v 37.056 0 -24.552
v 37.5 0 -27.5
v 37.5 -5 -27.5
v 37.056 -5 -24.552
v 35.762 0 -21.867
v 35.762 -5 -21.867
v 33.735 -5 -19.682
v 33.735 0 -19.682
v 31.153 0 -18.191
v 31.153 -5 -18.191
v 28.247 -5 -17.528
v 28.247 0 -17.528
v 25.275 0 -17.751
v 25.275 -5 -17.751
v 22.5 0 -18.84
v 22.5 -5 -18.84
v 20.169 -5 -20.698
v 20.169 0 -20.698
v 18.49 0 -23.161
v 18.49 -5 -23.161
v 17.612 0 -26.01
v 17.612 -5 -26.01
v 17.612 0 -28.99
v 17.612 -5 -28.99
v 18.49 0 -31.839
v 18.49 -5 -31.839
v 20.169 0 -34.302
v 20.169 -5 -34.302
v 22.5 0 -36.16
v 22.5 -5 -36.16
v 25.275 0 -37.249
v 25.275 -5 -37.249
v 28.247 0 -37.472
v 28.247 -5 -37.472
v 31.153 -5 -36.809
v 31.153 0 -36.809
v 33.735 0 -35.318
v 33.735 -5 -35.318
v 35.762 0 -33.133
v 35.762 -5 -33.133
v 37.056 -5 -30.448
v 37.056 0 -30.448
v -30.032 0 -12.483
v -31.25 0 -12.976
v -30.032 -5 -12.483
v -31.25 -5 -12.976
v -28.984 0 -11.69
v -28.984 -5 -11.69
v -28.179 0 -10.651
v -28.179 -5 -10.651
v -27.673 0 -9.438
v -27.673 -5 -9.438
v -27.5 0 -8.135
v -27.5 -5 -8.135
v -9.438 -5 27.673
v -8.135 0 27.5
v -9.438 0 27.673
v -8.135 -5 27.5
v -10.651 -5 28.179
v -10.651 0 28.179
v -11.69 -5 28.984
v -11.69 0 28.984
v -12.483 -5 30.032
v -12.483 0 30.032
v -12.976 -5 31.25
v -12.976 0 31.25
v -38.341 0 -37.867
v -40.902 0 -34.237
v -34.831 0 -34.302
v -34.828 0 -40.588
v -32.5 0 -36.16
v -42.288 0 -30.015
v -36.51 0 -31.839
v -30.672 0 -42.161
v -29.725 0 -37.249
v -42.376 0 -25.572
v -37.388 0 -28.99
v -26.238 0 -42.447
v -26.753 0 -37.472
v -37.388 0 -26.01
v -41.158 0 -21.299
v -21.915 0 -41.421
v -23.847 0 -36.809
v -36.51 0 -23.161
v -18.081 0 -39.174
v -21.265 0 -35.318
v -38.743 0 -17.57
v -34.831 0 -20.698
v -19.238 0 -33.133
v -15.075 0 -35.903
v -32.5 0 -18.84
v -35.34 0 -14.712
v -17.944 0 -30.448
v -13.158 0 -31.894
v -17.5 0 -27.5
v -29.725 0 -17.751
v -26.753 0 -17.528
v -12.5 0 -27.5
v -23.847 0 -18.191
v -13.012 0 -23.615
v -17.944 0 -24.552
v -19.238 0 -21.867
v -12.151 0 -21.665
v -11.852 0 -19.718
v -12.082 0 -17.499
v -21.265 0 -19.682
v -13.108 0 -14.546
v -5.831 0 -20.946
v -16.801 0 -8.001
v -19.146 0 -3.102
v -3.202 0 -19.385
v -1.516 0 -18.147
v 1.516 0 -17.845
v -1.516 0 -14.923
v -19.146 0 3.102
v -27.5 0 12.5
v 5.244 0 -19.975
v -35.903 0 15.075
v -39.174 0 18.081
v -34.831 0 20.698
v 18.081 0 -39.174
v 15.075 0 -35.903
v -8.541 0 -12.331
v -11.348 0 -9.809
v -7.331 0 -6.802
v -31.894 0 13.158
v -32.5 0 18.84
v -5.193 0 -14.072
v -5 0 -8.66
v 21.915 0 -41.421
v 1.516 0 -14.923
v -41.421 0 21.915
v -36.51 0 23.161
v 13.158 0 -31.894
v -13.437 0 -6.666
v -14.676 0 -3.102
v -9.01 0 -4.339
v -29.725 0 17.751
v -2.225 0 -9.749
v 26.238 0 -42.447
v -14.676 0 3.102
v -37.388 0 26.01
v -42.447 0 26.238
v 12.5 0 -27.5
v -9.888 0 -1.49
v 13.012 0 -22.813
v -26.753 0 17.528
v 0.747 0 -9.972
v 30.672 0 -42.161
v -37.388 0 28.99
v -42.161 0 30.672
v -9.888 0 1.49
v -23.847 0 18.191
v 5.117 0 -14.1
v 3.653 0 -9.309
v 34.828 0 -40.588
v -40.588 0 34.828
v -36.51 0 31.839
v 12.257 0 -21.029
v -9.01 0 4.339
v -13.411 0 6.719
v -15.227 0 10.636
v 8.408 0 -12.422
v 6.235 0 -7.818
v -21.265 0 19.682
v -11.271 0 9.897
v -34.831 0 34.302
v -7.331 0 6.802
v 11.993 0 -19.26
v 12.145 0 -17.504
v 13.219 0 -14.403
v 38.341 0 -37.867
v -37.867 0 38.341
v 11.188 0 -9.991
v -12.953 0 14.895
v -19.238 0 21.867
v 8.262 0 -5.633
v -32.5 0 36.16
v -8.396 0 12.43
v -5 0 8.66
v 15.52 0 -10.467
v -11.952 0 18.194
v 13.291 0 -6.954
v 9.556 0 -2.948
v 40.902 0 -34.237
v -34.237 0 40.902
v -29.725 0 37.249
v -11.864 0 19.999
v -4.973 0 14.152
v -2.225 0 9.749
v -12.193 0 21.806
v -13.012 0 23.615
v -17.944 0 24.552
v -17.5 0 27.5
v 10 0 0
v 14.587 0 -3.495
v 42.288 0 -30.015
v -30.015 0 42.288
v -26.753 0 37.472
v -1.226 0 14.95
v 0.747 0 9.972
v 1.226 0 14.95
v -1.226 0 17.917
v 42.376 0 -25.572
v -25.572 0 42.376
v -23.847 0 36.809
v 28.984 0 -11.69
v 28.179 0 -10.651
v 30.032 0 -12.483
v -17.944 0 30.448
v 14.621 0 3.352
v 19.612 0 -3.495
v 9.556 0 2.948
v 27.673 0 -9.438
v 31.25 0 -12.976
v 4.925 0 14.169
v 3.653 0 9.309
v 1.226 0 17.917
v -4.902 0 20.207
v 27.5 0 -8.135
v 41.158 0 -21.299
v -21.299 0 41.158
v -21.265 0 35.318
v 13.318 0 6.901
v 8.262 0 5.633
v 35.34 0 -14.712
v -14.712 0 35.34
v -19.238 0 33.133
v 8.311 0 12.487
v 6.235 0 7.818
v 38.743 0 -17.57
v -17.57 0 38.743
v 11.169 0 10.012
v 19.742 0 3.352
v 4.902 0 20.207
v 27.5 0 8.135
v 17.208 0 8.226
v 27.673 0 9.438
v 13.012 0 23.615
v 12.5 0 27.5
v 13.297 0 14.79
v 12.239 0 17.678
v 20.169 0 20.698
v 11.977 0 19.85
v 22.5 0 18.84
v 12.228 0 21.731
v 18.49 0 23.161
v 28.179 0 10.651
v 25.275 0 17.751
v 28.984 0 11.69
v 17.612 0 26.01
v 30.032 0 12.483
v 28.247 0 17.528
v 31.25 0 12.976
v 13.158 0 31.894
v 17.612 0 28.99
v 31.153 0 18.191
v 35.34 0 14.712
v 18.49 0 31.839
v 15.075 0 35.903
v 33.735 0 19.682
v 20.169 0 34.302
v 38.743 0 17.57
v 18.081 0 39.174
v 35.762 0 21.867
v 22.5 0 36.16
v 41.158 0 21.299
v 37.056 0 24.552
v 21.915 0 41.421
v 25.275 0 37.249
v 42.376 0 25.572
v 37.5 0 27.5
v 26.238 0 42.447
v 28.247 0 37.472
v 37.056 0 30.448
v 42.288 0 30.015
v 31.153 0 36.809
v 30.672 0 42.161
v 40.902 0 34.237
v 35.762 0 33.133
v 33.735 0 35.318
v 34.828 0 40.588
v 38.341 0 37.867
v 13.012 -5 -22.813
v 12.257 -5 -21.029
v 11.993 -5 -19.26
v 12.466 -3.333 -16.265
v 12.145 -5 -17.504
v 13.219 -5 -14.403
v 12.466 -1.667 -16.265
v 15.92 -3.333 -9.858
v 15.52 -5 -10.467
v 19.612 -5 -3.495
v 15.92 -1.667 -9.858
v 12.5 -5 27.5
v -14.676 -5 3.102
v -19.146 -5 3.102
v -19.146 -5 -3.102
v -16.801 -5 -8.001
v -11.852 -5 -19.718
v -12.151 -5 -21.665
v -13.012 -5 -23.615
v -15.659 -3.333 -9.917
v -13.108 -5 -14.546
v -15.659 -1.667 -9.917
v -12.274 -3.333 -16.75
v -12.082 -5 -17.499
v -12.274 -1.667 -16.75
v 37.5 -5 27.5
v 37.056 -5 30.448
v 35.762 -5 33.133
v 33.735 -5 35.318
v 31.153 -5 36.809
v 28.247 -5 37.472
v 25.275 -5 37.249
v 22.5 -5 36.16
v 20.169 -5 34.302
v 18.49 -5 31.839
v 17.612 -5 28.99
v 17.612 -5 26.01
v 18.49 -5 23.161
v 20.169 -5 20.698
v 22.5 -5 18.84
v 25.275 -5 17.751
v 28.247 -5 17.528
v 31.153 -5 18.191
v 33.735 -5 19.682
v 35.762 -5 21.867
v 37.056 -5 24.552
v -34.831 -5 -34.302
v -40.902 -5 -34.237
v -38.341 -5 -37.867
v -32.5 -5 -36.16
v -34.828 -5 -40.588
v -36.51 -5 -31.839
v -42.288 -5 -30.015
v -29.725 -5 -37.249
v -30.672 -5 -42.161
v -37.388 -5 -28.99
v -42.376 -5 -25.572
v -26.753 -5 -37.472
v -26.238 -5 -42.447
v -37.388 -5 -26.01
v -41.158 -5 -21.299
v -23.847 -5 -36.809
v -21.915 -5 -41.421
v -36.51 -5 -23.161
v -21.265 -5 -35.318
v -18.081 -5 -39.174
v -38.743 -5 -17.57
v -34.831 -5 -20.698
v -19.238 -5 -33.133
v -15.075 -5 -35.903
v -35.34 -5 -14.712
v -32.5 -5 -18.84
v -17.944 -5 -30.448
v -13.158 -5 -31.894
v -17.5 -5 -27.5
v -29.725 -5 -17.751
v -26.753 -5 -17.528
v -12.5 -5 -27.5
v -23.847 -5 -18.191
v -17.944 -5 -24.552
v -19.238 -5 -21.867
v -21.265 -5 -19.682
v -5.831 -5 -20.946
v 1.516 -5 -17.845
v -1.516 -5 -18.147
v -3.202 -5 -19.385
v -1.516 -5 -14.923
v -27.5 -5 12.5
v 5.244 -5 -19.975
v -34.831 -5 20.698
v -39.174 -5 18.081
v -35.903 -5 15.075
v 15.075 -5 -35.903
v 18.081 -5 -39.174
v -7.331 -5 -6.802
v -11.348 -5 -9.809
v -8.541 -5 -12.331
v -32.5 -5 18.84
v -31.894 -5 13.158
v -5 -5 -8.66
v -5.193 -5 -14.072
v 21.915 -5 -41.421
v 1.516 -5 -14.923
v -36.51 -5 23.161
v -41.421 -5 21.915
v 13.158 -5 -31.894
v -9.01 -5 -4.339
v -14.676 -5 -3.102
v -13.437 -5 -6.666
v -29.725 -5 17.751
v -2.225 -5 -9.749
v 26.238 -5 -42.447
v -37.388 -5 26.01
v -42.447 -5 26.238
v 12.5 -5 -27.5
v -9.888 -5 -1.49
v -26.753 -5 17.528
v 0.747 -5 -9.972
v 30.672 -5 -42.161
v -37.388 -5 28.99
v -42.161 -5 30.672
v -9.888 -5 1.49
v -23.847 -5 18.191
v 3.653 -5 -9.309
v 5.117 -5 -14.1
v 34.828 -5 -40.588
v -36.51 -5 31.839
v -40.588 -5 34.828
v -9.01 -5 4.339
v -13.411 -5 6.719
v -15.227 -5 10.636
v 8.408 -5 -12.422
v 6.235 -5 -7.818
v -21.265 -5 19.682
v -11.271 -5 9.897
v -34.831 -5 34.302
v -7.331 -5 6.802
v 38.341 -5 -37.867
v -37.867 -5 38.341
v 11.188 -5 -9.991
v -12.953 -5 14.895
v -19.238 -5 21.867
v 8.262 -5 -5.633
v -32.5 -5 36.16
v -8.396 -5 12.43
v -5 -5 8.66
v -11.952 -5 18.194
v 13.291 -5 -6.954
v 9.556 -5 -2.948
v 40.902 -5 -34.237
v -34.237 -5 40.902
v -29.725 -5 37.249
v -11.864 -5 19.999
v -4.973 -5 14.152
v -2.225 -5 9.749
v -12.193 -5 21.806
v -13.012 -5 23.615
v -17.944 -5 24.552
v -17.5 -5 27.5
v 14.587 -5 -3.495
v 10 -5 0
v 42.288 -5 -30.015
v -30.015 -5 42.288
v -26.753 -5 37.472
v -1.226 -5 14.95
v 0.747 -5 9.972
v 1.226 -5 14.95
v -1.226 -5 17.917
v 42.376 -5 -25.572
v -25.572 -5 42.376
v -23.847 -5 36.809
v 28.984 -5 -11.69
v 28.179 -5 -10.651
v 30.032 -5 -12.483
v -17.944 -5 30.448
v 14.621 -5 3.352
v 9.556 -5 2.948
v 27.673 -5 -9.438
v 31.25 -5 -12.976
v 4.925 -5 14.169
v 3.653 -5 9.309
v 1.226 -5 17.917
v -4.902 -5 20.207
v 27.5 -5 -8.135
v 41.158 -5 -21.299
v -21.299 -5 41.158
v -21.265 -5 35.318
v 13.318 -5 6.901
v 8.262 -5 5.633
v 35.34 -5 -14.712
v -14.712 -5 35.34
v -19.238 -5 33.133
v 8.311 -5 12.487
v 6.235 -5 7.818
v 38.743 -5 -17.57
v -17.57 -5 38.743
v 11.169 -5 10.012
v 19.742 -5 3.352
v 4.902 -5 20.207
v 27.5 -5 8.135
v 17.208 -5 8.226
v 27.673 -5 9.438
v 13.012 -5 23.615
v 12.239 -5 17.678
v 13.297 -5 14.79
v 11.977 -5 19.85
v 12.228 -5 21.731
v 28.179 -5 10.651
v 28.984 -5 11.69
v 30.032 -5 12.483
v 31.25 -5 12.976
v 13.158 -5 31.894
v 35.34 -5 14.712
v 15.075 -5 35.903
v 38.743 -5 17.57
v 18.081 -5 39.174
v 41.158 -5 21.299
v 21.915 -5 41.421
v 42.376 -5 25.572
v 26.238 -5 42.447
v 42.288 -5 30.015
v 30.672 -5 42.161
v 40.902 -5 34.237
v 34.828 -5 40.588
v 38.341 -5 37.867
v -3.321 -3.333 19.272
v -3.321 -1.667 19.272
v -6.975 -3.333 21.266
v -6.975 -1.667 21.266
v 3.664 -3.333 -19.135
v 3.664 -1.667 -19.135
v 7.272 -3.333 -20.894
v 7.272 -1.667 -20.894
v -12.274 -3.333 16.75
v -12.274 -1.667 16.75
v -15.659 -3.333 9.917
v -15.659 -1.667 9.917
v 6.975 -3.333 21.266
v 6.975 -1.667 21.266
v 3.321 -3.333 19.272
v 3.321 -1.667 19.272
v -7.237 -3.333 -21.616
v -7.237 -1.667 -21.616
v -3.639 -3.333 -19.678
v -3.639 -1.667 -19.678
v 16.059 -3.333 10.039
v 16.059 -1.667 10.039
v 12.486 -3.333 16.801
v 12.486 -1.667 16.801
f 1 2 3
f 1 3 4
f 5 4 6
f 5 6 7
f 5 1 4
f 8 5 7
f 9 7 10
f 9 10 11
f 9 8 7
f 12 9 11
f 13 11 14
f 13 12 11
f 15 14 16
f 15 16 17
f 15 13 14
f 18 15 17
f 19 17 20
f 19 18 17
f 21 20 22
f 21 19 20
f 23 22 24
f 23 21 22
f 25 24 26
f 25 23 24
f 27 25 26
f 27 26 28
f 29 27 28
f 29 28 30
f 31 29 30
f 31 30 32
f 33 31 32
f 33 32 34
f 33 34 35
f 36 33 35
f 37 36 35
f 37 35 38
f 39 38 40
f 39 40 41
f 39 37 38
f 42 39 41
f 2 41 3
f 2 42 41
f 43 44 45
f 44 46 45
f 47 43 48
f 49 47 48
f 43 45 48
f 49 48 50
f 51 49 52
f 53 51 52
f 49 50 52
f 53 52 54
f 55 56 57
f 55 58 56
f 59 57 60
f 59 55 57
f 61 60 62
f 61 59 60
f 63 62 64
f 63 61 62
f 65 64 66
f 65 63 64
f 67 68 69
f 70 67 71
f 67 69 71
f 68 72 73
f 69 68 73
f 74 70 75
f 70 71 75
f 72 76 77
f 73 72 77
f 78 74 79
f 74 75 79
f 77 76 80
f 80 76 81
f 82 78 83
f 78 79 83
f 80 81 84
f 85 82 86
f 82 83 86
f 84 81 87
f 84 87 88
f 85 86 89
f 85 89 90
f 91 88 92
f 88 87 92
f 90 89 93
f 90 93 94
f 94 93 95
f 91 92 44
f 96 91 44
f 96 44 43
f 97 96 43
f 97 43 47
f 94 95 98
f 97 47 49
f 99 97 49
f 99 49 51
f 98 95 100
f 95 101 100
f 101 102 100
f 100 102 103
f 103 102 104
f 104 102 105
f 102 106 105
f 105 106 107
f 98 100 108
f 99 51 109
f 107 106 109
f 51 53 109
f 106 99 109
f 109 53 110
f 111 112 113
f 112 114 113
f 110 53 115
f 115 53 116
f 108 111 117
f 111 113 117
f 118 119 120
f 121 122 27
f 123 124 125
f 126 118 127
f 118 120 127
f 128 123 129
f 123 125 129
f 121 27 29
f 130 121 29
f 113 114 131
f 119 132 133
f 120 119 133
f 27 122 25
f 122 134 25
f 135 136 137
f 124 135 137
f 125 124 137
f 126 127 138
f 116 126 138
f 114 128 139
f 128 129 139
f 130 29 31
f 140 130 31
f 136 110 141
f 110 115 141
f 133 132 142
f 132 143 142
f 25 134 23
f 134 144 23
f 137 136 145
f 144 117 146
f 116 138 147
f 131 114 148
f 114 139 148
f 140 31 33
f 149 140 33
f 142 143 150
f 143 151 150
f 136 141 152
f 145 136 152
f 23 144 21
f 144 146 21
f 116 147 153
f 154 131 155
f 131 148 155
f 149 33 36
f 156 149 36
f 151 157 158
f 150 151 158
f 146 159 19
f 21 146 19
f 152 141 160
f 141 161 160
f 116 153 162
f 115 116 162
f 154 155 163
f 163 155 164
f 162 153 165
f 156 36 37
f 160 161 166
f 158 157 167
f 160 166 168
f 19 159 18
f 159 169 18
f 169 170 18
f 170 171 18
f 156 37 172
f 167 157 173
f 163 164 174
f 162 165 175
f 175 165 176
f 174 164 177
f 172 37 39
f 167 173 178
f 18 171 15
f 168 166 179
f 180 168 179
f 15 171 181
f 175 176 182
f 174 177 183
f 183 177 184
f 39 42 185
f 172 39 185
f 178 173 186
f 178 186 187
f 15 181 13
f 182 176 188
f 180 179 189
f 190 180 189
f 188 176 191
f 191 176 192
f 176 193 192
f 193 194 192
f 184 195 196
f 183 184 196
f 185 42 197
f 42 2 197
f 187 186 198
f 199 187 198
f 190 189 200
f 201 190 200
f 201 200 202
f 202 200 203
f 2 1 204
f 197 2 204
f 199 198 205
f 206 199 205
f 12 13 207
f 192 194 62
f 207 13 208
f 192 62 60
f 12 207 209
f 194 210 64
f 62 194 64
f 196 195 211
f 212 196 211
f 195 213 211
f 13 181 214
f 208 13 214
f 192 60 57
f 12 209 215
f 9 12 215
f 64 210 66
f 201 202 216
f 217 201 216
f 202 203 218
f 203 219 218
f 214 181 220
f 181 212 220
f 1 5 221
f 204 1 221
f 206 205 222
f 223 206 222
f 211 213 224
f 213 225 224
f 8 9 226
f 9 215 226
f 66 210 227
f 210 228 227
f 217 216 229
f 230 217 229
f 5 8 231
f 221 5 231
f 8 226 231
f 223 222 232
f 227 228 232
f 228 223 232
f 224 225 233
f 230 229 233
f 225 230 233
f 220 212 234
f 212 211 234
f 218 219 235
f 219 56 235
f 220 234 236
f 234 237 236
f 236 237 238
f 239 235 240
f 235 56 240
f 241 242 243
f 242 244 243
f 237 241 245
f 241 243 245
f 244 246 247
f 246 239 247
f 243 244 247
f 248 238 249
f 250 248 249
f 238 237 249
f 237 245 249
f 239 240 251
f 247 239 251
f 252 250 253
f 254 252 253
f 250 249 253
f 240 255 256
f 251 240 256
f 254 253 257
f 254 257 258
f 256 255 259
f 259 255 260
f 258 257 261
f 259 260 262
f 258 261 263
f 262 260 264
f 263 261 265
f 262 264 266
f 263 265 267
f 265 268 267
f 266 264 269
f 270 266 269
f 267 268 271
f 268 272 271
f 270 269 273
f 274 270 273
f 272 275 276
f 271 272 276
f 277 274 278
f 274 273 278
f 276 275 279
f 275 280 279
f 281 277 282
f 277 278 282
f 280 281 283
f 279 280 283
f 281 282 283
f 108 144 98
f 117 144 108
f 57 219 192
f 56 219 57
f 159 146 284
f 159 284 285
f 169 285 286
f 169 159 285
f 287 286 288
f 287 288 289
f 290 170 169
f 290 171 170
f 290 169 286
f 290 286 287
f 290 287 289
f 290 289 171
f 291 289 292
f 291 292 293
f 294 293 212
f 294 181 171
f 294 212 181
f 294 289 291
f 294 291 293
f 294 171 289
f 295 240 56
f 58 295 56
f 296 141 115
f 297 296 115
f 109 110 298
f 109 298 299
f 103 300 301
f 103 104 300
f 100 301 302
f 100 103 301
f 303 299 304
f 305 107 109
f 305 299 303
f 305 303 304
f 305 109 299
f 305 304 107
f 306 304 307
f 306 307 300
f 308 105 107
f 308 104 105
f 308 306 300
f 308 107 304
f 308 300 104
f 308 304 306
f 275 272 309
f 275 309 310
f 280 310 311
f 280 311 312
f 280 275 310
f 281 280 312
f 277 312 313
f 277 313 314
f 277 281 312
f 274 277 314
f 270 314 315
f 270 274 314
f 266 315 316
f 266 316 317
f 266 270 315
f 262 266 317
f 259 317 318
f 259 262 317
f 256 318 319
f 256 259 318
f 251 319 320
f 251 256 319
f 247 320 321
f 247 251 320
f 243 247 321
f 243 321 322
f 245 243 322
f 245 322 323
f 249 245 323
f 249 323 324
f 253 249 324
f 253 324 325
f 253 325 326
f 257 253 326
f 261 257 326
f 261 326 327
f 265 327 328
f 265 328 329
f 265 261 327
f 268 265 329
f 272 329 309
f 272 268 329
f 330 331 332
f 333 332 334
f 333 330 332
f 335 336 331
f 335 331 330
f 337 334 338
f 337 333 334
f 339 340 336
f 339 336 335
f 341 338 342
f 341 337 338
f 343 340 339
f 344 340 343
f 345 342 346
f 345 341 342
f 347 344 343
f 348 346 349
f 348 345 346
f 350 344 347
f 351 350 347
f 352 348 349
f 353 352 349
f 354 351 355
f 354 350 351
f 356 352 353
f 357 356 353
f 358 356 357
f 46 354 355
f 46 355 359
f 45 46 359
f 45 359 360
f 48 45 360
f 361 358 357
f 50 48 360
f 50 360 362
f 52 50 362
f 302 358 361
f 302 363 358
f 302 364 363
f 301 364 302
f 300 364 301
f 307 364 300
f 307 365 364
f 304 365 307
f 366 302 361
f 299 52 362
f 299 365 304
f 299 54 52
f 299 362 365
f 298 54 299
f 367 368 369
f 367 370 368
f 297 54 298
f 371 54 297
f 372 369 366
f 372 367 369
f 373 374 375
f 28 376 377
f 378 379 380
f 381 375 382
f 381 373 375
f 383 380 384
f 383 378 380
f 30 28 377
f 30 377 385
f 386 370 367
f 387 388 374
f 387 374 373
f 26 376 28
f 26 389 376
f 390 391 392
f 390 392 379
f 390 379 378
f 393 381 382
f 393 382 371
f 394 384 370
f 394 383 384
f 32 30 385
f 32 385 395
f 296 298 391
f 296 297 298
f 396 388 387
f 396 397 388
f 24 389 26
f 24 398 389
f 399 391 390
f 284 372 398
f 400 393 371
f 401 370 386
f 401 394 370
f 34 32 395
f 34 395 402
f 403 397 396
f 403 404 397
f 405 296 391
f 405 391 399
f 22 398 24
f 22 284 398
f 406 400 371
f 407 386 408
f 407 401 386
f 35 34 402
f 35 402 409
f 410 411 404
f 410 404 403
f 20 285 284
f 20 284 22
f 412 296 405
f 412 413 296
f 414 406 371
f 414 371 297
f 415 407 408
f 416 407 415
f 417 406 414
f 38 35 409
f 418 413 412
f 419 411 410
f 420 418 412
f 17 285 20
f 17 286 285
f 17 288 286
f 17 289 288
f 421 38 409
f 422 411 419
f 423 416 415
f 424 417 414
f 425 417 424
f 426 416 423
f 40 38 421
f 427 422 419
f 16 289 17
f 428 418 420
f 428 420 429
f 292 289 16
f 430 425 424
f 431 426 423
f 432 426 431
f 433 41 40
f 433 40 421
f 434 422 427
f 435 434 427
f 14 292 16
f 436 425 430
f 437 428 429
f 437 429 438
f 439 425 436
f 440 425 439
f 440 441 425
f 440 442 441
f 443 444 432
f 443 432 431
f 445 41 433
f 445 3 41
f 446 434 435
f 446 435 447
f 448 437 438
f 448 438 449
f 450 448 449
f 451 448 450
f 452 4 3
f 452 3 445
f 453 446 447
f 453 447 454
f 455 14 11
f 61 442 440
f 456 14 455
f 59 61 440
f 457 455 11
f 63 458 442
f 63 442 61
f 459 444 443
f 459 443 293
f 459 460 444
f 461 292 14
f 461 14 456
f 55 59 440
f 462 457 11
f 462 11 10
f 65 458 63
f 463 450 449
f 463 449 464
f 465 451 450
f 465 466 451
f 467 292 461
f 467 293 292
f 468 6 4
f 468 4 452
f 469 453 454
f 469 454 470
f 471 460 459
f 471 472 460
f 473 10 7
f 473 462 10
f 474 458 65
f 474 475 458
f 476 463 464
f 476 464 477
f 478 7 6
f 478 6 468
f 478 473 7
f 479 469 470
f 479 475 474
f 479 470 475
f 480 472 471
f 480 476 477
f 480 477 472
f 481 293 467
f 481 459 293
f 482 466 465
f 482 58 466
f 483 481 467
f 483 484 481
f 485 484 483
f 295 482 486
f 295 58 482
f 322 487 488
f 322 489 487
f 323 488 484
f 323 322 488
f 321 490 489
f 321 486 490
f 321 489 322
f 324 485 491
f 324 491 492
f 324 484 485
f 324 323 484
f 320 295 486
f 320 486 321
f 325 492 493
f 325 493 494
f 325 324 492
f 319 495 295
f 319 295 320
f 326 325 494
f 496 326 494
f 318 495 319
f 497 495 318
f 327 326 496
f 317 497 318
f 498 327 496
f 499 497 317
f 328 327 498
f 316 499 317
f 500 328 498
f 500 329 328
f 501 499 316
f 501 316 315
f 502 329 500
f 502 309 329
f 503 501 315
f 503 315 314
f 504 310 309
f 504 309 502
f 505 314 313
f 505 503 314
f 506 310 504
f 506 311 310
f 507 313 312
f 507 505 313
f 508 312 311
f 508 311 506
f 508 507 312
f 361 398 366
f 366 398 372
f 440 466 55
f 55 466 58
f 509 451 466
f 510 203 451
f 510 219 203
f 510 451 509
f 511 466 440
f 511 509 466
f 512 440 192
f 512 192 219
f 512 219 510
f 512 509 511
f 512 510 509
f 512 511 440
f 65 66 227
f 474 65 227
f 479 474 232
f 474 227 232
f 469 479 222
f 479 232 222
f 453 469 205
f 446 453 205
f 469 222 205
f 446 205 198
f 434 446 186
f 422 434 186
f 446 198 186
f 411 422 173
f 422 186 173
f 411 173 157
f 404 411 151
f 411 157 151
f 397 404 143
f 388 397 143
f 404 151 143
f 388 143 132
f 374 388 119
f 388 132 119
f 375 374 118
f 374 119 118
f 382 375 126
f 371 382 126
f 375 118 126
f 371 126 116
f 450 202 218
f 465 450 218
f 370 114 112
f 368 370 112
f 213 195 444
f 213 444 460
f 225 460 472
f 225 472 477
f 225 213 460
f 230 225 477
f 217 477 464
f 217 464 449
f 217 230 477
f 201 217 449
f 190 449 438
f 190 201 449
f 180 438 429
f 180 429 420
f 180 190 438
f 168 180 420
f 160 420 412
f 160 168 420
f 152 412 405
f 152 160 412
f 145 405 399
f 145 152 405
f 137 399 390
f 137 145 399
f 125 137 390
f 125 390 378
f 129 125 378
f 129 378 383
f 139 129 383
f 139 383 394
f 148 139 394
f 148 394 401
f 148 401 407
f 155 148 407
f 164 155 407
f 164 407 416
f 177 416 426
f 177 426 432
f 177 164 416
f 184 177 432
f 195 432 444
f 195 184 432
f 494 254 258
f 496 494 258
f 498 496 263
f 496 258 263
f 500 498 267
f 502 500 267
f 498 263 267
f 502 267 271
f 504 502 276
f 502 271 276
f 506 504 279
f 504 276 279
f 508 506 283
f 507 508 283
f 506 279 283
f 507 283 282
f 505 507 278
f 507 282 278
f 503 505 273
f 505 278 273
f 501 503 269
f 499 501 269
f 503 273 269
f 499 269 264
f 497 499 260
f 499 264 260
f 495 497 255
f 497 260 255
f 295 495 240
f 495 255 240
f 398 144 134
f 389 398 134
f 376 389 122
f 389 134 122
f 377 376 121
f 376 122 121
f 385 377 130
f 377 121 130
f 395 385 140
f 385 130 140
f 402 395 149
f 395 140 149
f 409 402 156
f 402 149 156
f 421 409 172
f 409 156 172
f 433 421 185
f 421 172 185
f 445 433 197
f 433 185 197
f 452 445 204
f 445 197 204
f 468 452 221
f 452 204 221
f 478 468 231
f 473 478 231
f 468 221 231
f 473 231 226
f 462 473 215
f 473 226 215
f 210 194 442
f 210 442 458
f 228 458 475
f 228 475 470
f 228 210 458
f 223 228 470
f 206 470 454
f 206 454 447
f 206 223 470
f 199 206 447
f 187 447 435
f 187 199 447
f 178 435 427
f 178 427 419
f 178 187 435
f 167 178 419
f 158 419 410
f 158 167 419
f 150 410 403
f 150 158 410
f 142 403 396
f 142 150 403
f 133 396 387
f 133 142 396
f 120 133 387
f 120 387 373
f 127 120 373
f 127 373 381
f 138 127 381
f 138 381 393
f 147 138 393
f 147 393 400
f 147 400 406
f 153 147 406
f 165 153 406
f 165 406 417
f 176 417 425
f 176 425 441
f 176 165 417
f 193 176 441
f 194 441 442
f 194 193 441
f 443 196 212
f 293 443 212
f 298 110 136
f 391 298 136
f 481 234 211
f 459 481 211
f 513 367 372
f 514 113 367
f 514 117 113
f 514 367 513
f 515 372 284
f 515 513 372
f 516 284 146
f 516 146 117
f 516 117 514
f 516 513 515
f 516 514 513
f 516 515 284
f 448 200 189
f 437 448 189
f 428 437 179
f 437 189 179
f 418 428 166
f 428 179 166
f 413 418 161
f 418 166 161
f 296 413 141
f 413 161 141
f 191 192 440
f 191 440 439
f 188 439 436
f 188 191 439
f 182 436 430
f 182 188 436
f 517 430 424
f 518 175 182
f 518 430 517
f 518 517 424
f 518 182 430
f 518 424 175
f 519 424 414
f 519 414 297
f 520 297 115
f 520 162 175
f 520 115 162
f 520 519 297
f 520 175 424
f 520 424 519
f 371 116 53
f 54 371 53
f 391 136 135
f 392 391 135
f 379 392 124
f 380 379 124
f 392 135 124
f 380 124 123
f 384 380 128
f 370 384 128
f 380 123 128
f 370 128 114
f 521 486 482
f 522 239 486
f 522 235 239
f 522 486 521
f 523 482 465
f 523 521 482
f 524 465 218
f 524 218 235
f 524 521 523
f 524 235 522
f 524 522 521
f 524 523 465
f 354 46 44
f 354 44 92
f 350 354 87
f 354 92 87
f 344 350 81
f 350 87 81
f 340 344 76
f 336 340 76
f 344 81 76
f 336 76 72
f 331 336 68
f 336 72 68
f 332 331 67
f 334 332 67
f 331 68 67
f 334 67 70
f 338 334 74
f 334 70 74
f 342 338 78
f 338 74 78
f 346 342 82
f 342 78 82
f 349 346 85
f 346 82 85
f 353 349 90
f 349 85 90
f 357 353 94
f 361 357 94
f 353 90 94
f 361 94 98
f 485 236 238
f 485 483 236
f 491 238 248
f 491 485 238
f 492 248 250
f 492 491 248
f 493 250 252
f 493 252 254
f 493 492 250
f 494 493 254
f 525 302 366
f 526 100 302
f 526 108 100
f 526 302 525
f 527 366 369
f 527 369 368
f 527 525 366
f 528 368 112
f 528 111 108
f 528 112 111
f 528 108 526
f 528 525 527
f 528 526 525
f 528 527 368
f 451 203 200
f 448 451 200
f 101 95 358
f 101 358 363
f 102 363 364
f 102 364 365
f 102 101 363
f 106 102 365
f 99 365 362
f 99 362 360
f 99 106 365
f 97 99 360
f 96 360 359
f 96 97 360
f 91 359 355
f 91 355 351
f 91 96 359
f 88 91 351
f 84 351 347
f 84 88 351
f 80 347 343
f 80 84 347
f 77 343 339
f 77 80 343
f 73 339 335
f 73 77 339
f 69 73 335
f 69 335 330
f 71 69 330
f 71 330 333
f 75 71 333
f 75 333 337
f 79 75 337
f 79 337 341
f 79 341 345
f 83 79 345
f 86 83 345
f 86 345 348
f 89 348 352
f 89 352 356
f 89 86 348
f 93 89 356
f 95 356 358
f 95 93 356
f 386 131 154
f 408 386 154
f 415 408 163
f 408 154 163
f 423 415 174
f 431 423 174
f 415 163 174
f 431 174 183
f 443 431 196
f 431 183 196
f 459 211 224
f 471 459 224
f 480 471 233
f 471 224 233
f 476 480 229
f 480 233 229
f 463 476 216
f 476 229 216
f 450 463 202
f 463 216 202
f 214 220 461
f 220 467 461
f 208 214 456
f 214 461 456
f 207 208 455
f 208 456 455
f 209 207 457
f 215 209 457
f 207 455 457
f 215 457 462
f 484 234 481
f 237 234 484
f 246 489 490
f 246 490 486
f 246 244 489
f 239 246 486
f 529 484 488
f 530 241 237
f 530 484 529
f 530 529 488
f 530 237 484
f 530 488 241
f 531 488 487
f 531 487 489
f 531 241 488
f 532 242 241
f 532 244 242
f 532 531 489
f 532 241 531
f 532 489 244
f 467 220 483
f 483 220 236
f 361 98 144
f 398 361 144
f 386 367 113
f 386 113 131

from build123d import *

# Parameters (mm, degrees)
F0_R     = 10
F1_DEPTH = 5
F2_R     = 5
F3_R     = 5
F4_DEPTH = 25


with BuildPart() as f1:
    # F0 (on Front) → F1 (new body)
    with BuildSketch(Plane.XZ):
        with BuildLine():
            add(Edge.make_bspline(
                [(19.6117025062, -3.4953018185), (20.0776619455, -2.3335824214), (20.6438929209, -0.0613566909), (20.1493664179, 2.2303480995), (19.742406118, 3.3519886549)],
                knots=[0.4195745688, 0.4195745688, 0.4195745688, 0.4195745688, 0.4960722568, 0.5688744263, 0.5688744263, 0.5688744263, 0.5688744263], degree=3))
            Line((19.742406118, 3.3519886549), (14.6206761833, 3.3519886549))
            ThreePointArc((14.6206761833, 3.3519886549), (14.9048673719, 1.6866916212), (15, 0))
            ThreePointArc((15, 0), (14.8964119942, -1.7598038809), (14.5870787068, -3.4953018185))
            Line((14.5870787068, -3.4953018185), (19.6117025062, -3.4953018185))
        make_face()
        with BuildLine():
            add(Edge.make_bspline(
                [(-1.5163984723, -18.1465453552), (-0.9012756584, -17.6861315251), (-0.0133596841, -17.0968852874), (0.8972354155, -17.4862781525), (1.5163984723, -17.845237755)],
                knots=[0.3644446734, 0.3644446734, 0.3644446734, 0.3644446734, 0.5028904355, 0.6389885865, 0.6389885865, 0.6389885865, 0.6389885865], degree=3))
            Line((1.5163984723, -17.845237755), (1.5163984723, -14.9231543473))
            ThreePointArc((1.5163984723, -14.9231543473), (0, -15), (-1.5163984723, -14.9231543473))
            Line((-1.5163984723, -14.9231543473), (-1.5163984723, -18.1465453552))
        make_face()
        with BuildLine():
            Line((-14.6757838937, 3.1018328621), (-19.1463490467, 3.1018328621))
            add(Edge.make_bspline(
                [(-19.1463490467, 3.1018328621), (-19.4804537552, 2.0677531569), (-19.877871021, 0), (-19.4804537552, -2.0677531569), (-19.1463490467, -3.1018328621)],
                knots=[0.434082988, 0.434082988, 0.434082988, 0.434082988, 0.5, 0.565917012, 0.565917012, 0.565917012, 0.565917012], degree=3))
            Line((-19.1463490467, -3.1018328621), (-14.6757838937, -3.1018328621))
            ThreePointArc((-14.6757838937, -3.1018328621), (-15, 0), (-14.6757838937, 3.1018328621))
        make_face()
        with BuildLine():
            Line((1.225561158, 14.9498494925), (1.225561158, 17.9168751217))
            add(Edge.make_bspline(
                [(1.225561158, 17.9168751217), (0.7517359921, 17.6368227378), (0, 17.3228835959), (-0.7517359921, 17.6368227378), (-1.225561158, 17.9168751217)],
                knots=[0.3852289018, 0.3852289018, 0.3852289018, 0.3852289018, 0.5, 0.6147710982, 0.6147710982, 0.6147710982, 0.6147710982], degree=3))
            Line((-1.225561158, 17.9168751217), (-1.225561158, 14.9498494925))
            ThreePointArc((-1.225561158, 14.9498494925), (0, 15), (1.225561158, 14.9498494925))
        make_face()
        with BuildLine():
            Line((27.5, -12.5), (27.5, 12.5))
            ThreePointArc((27.5, 12.5), (18.3695172954, 15.5989796412), (13.0117252596, 23.6154285891))
            add(Edge.make_bspline(
                [(19.742406118, 3.3519886549), (17.3324368296, 9.9942072978), (9.1074771998, 16.7819842724), (13.0117252596, 23.6154285891)],
                knots=[0.5688744263, 0.5688744263, 0.5688744263, 0.5688744263, 1, 1, 1, 1], degree=3))
            add(Edge.make_bspline(
                [(19.6117025062, -3.4953018185), (20.0776619455, -2.3335824214), (20.6438929209, -0.0613566909), (20.1493664179, 2.2303480995), (19.742406118, 3.3519886549)],
                knots=[0.4195745688, 0.4195745688, 0.4195745688, 0.4195745688, 0.4960722568, 0.5688744263, 0.5688744263, 0.5688744263, 0.5688744263], degree=3))
            add(Edge.make_bspline(
                [(13.0117252596, -22.8125530654), (9.2106265425, -16.1632445639), (17.0560078684, -9.8671011282), (19.6117025062, -3.4953018185)],
                knots=[0, 0, 0, 0, 0.4195745688, 0.4195745688, 0.4195745688, 0.4195745688], degree=3))
            add(Edge.make_bspline(
                [(1.5163984723, -17.845237755), (3.1587788316, -18.7974072918), (5.9815411198, -20.9170774405), (13.0117252596, -22.8125530654)],
                knots=[0.6389885865, 0.6389885865, 0.6389885865, 0.6389885865, 1, 1, 1, 1], degree=3))
            add(Edge.make_bspline(
                [(-1.5163984723, -18.1465453552), (-0.9012756584, -17.6861315251), (-0.0133596841, -17.0968852874), (0.8972354155, -17.4862781525), (1.5163984723, -17.845237755)],
                knots=[0.3644446734, 0.3644446734, 0.3644446734, 0.3644446734, 0.5028904355, 0.6389885865, 0.6389885865, 0.6389885865, 0.6389885865], degree=3))
            add(Edge.make_bspline(
                [(-13.0117252596, -23.6154285891), (-5.9146832629, -21.7019267737), (-3.1356479862, -19.3585388852), (-1.5163984723, -18.1465453552)],
                knots=[0, 0, 0, 0, 0.3644446734, 0.3644446734, 0.3644446734, 0.3644446734], degree=3))
            ThreePointArc((-13.0117252596, -23.6154285891), (-12.6284815653, -25.5409340371), (-12.5, -27.5))
            Line((-12.5, -27.5), (12.5, -27.5))
            ThreePointArc((12.5, -27.5), (16.8933982822, -16.8933982822), (27.5, -12.5))
        make_face()
        with BuildLine():
            ThreePointArc((-13.0117252596, 23.6154285891), (-18.3695172954, 15.5989796412), (-27.5, 12.5))
            Line((-27.5, 12.5), (-27.5, -12.5))
            ThreePointArc((-27.5, -12.5), (-18.3695172954, -15.5989796412), (-13.0117252596, -23.6154285891))
            add(Edge.make_bspline(
                [(-19.1463490467, -3.1018328621), (-16.9461708863, -9.9115530651), (-8.8743910836, -16.7300820857), (-13.0117252596, -23.6154285891)],
                knots=[0.565917012, 0.565917012, 0.565917012, 0.565917012, 1, 1, 1, 1], degree=3))
            add(Edge.make_bspline(
                [(-19.1463490467, 3.1018328621), (-19.4804537552, 2.0677531569), (-19.877871021, 0), (-19.4804537552, -2.0677531569), (-19.1463490467, -3.1018328621)],
                knots=[0.434082988, 0.434082988, 0.434082988, 0.434082988, 0.5, 0.565917012, 0.565917012, 0.565917012, 0.565917012], degree=3))
            add(Edge.make_bspline(
                [(-13.0117252596, 23.6154285891), (-8.8743910836, 16.7300820857), (-16.9461708863, 9.9115530651), (-19.1463490467, 3.1018328621)],
                knots=[0, 0, 0, 0, 0.434082988, 0.434082988, 0.434082988, 0.434082988], degree=3))
        make_face()
        with BuildLine():
            ThreePointArc((13.0117252596, 23.6154285891), (12.6284815653, 25.5409340371), (12.5, 27.5))
            Line((12.5, 27.5), (-12.5, 27.5))
            ThreePointArc((-12.5, 27.5), (-12.6284815653, 25.5409340371), (-13.0117252596, 23.6154285891))
            add(Edge.make_bspline(
                [(-1.225561158, 17.9168751217), (-2.8159541317, 18.856870242), (-5.5099399576, 21.1835256037), (-13.0117252596, 23.6154285891)],
                knots=[0.6147710982, 0.6147710982, 0.6147710982, 0.6147710982, 1, 1, 1, 1], degree=3))
            add(Edge.make_bspline(
                [(1.225561158, 17.9168751217), (0.7517359921, 17.6368227378), (0, 17.3228835959), (-0.7517359921, 17.6368227378), (-1.225561158, 17.9168751217)],
                knots=[0.3852289018, 0.3852289018, 0.3852289018, 0.3852289018, 0.5, 0.6147710982, 0.6147710982, 0.6147710982, 0.6147710982], degree=3))
            add(Edge.make_bspline(
                [(13.0117252596, 23.6154285891), (5.5099399576, 21.1835256037), (2.8159541317, 18.856870242), (1.225561158, 17.9168751217)],
                knots=[0, 0, 0, 0, 0.3852289018, 0.3852289018, 0.3852289018, 0.3852289018], degree=3))
        make_face()
        with BuildLine():
            ThreePointArc((27.5, 12.5), (38.1066017178, 16.8933982822), (42.5, 27.5))
            ThreePointArc((42.5, 27.5), (27.5, 42.5), (12.5, 27.5))
            ThreePointArc((12.5, 27.5), (12.6284815653, 25.5409340371), (13.0117252596, 23.6154285891))
            ThreePointArc((13.0117252596, 23.6154285891), (18.3695172954, 15.5989796412), (27.5, 12.5))
        make_face()
        with Locations((27.5, 27.5)):
            Circle(F0_R, mode=Mode.SUBTRACT)
        with BuildLine():
            ThreePointArc((15, 0), (14.9048673719, 1.6866916212), (14.6206761833, 3.3519886549))
            ThreePointArc((14.6206761833, 3.3519886549), (9.8185234873, 11.3400439386), (1.225561158, 14.9498494925))
            ThreePointArc((1.225561158, 14.9498494925), (0, 15), (-1.225561158, 14.9498494925))
            ThreePointArc((-1.225561158, 14.9498494925), (-9.9149920894, 11.2557954791), (-14.6757838937, 3.1018328621))
            ThreePointArc((-14.6757838937, 3.1018328621), (-15, 0), (-14.6757838937, -3.1018328621))
            ThreePointArc((-14.6757838937, -3.1018328621), (-10.0241010997, -11.1587363596), (-1.5163984723, -14.9231543473))
            ThreePointArc((-1.5163984723, -14.9231543473), (0, -15), (1.5163984723, -14.9231543473))
            ThreePointArc((1.5163984723, -14.9231543473), (9.8731680665, -11.2924998265), (14.5870787068, -3.4953018185))
            ThreePointArc((14.5870787068, -3.4953018185), (14.8964119942, -1.7598038809), (15, 0))
        make_face()
        Circle(F0_R, mode=Mode.SUBTRACT)
        with BuildLine():
            ThreePointArc((42.5, -27.5), (38.1066017178, -16.8933982822), (27.5, -12.5))
            ThreePointArc((27.5, -12.5), (16.8933982822, -16.8933982822), (12.5, -27.5))
            ThreePointArc((12.5, -27.5), (27.5, -42.5), (42.5, -27.5))
        make_face()
        with Locations((27.5, -27.5)):
            Circle(F0_R, mode=Mode.SUBTRACT)
        with BuildLine():
            ThreePointArc((-13.0117252596, -23.6154285891), (-18.3695172954, -15.5989796412), (-27.5, -12.5))
            ThreePointArc((-27.5, -12.5), (-38.1066017178, -38.1066017178), (-12.5, -27.5))
            ThreePointArc((-12.5, -27.5), (-12.6284815653, -25.5409340371), (-13.0117252596, -23.6154285891))
        make_face()
        with Locations((-27.5, -27.5)):
            Circle(F0_R, mode=Mode.SUBTRACT)
        with BuildLine():
            ThreePointArc((-13.0117252596, 23.6154285891), (-12.6284815653, 25.5409340371), (-12.5, 27.5))
            ThreePointArc((-12.5, 27.5), (-38.1066017178, 38.1066017178), (-27.5, 12.5))
            ThreePointArc((-27.5, 12.5), (-18.3695172954, 15.5989796412), (-13.0117252596, 23.6154285891))
        make_face()
        with Locations((-27.5, 27.5)):
            Circle(F0_R, mode=Mode.SUBTRACT)
    extrude(amount=F1_DEPTH)

    # F2
    f2_edges = [f1.edges().sort_by_distance(p)[0] for p in [
        (27.5, -2.5, -12.5),
    ]]
    fillet(f2_edges, radius=F2_R)

    # F3
    f3_edges = [f1.edges().sort_by_distance(p)[0] for p in [
        (-27.5, -2.5, -12.5),
        (-12.5, -2.5, 27.5),
        (27.5, -2.5, 12.5),
    ]]
    fillet(f3_edges, radius=F3_R)


with BuildPart() as f4:
    # F0 (on Front) → F4 (new body)
    with BuildSketch(Plane.XZ):
        Circle(F0_R)
    extrude(amount=F4_DEPTH)


solid = f1.part
